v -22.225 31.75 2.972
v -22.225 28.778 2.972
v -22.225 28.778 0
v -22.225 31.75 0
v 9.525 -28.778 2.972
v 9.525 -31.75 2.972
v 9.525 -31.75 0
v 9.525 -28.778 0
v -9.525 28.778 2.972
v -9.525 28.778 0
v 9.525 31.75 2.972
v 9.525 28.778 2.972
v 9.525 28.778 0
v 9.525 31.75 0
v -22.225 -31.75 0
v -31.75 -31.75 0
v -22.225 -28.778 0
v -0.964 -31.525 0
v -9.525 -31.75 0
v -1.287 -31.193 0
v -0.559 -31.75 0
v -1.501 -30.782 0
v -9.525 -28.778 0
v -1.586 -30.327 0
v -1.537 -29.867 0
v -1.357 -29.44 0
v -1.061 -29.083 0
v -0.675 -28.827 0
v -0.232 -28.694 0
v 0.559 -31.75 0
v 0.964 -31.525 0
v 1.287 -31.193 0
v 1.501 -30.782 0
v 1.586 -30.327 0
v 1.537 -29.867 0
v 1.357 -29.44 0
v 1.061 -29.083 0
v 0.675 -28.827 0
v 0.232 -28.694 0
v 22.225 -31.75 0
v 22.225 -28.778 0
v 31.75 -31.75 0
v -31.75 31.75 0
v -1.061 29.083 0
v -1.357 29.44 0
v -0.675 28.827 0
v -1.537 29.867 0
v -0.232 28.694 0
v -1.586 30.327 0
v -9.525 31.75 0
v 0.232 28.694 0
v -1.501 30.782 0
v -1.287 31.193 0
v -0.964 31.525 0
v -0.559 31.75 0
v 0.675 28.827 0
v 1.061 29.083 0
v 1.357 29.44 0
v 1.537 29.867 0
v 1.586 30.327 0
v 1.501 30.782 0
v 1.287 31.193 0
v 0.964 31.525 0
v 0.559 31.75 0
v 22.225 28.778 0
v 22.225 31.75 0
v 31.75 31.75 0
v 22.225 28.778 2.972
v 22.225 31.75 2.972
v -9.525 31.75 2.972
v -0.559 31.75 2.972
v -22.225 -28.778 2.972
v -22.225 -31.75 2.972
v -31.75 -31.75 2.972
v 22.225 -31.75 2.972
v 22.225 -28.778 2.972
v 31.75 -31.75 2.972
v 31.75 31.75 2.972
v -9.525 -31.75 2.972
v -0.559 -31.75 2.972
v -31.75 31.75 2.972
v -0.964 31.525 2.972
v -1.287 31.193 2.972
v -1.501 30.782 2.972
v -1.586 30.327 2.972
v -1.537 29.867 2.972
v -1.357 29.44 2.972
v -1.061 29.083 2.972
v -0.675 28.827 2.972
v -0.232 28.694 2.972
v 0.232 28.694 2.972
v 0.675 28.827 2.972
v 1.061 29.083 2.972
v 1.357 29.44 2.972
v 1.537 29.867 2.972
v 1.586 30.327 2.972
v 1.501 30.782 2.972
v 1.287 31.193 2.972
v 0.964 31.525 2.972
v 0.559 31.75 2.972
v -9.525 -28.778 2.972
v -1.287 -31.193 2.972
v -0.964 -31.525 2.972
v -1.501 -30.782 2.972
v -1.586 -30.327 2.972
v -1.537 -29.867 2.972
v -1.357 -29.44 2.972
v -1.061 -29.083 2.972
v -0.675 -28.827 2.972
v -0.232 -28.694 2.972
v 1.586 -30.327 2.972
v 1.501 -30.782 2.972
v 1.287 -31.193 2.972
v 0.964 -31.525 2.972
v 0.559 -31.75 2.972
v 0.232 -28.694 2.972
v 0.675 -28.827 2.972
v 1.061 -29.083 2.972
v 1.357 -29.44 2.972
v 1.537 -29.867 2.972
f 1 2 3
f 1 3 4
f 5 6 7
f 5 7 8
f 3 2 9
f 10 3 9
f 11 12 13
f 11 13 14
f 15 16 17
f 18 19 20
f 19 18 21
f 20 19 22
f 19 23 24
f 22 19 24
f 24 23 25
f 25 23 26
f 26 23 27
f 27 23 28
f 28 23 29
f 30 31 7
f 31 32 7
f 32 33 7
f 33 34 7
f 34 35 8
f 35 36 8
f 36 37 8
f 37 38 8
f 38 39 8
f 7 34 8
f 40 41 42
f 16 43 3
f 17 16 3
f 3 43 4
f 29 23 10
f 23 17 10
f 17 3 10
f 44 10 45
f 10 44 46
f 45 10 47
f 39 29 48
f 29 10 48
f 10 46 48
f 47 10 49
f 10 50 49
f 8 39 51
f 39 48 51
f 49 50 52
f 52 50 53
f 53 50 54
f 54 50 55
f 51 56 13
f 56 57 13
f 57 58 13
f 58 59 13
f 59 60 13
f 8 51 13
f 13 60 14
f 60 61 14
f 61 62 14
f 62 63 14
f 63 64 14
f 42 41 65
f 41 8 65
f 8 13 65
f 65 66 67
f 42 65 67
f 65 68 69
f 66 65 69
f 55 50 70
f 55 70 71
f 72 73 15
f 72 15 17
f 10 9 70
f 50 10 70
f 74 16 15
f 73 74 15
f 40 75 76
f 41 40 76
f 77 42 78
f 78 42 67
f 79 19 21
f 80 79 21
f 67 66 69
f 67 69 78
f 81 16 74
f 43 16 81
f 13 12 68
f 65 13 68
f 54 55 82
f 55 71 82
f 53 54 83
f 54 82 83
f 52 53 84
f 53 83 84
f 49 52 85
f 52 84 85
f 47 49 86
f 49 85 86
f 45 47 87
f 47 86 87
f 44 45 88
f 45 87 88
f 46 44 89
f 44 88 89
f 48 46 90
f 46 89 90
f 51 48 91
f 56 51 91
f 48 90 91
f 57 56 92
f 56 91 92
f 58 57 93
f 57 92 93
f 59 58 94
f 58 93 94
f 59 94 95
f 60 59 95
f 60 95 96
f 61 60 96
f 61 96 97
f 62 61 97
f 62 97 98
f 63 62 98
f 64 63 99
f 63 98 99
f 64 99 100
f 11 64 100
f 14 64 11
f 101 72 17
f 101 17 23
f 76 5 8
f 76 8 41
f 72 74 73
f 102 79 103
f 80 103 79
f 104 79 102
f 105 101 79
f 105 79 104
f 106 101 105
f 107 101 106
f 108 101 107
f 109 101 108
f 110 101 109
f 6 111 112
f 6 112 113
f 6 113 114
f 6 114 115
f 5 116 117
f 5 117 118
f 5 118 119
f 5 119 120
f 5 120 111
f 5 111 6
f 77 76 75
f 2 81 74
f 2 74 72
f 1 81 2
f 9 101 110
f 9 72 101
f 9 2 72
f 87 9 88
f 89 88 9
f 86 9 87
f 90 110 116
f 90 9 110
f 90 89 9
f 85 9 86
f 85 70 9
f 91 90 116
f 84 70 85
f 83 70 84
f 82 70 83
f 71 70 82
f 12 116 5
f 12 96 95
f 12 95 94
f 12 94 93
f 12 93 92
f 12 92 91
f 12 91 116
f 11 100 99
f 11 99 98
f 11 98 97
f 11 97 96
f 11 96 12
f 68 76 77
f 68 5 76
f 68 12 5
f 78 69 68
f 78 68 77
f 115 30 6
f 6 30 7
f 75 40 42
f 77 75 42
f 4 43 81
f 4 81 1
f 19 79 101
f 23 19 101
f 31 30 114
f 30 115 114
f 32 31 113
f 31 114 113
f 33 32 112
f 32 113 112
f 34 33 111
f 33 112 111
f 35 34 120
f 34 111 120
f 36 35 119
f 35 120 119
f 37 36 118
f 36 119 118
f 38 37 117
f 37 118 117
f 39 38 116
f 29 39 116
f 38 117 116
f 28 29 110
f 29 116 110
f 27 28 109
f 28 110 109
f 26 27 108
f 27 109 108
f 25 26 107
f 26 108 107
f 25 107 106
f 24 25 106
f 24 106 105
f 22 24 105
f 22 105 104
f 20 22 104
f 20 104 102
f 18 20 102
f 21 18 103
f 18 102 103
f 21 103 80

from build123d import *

# Parameters (mm, degrees)
SKETCH1_W           = 63.5
SKETCH1_H           = 63.5
BOSS_EXTRUDE1_DEPTH = 2.9718
SKETCH2_R           = 1.5875
SKETCH2_W           = 12.7
SKETCH2_H           = 2.9718
CUT_EXTRUDE1_DEPTH  = 45.999517722


with BuildPart() as part:
    # Sketch1 → Boss-Extrude1 (new body)
    with BuildSketch(Plane.XY):
        Rectangle(SKETCH1_W, SKETCH1_H)
    extrude(amount=BOSS_EXTRUDE1_DEPTH)

    # Sketch2 → Cut-Extrude1 (cut, through all)
    with BuildSketch(Plane.XY.offset(2.9718)):
        with Locations((0, -30.2641)):
            Circle(SKETCH2_R)
        with Locations((0, 30.2641)):
            Circle(SKETCH2_R)
        with Locations((15.875, -30.2641)):
            Rectangle(SKETCH2_W, SKETCH2_H)
        with Locations((-15.875, -30.2641)):
            Rectangle(SKETCH2_W, SKETCH2_H)
        with Locations((15.875, 30.2641)):
            Rectangle(SKETCH2_W, SKETCH2_H)
        with Locations((-15.875, 30.2641)):
            Rectangle(SKETCH2_W, SKETCH2_H)
    extrude(amount=-CUT_EXTRUDE1_DEPTH, mode=Mode.SUBTRACT)


solid = part.part
